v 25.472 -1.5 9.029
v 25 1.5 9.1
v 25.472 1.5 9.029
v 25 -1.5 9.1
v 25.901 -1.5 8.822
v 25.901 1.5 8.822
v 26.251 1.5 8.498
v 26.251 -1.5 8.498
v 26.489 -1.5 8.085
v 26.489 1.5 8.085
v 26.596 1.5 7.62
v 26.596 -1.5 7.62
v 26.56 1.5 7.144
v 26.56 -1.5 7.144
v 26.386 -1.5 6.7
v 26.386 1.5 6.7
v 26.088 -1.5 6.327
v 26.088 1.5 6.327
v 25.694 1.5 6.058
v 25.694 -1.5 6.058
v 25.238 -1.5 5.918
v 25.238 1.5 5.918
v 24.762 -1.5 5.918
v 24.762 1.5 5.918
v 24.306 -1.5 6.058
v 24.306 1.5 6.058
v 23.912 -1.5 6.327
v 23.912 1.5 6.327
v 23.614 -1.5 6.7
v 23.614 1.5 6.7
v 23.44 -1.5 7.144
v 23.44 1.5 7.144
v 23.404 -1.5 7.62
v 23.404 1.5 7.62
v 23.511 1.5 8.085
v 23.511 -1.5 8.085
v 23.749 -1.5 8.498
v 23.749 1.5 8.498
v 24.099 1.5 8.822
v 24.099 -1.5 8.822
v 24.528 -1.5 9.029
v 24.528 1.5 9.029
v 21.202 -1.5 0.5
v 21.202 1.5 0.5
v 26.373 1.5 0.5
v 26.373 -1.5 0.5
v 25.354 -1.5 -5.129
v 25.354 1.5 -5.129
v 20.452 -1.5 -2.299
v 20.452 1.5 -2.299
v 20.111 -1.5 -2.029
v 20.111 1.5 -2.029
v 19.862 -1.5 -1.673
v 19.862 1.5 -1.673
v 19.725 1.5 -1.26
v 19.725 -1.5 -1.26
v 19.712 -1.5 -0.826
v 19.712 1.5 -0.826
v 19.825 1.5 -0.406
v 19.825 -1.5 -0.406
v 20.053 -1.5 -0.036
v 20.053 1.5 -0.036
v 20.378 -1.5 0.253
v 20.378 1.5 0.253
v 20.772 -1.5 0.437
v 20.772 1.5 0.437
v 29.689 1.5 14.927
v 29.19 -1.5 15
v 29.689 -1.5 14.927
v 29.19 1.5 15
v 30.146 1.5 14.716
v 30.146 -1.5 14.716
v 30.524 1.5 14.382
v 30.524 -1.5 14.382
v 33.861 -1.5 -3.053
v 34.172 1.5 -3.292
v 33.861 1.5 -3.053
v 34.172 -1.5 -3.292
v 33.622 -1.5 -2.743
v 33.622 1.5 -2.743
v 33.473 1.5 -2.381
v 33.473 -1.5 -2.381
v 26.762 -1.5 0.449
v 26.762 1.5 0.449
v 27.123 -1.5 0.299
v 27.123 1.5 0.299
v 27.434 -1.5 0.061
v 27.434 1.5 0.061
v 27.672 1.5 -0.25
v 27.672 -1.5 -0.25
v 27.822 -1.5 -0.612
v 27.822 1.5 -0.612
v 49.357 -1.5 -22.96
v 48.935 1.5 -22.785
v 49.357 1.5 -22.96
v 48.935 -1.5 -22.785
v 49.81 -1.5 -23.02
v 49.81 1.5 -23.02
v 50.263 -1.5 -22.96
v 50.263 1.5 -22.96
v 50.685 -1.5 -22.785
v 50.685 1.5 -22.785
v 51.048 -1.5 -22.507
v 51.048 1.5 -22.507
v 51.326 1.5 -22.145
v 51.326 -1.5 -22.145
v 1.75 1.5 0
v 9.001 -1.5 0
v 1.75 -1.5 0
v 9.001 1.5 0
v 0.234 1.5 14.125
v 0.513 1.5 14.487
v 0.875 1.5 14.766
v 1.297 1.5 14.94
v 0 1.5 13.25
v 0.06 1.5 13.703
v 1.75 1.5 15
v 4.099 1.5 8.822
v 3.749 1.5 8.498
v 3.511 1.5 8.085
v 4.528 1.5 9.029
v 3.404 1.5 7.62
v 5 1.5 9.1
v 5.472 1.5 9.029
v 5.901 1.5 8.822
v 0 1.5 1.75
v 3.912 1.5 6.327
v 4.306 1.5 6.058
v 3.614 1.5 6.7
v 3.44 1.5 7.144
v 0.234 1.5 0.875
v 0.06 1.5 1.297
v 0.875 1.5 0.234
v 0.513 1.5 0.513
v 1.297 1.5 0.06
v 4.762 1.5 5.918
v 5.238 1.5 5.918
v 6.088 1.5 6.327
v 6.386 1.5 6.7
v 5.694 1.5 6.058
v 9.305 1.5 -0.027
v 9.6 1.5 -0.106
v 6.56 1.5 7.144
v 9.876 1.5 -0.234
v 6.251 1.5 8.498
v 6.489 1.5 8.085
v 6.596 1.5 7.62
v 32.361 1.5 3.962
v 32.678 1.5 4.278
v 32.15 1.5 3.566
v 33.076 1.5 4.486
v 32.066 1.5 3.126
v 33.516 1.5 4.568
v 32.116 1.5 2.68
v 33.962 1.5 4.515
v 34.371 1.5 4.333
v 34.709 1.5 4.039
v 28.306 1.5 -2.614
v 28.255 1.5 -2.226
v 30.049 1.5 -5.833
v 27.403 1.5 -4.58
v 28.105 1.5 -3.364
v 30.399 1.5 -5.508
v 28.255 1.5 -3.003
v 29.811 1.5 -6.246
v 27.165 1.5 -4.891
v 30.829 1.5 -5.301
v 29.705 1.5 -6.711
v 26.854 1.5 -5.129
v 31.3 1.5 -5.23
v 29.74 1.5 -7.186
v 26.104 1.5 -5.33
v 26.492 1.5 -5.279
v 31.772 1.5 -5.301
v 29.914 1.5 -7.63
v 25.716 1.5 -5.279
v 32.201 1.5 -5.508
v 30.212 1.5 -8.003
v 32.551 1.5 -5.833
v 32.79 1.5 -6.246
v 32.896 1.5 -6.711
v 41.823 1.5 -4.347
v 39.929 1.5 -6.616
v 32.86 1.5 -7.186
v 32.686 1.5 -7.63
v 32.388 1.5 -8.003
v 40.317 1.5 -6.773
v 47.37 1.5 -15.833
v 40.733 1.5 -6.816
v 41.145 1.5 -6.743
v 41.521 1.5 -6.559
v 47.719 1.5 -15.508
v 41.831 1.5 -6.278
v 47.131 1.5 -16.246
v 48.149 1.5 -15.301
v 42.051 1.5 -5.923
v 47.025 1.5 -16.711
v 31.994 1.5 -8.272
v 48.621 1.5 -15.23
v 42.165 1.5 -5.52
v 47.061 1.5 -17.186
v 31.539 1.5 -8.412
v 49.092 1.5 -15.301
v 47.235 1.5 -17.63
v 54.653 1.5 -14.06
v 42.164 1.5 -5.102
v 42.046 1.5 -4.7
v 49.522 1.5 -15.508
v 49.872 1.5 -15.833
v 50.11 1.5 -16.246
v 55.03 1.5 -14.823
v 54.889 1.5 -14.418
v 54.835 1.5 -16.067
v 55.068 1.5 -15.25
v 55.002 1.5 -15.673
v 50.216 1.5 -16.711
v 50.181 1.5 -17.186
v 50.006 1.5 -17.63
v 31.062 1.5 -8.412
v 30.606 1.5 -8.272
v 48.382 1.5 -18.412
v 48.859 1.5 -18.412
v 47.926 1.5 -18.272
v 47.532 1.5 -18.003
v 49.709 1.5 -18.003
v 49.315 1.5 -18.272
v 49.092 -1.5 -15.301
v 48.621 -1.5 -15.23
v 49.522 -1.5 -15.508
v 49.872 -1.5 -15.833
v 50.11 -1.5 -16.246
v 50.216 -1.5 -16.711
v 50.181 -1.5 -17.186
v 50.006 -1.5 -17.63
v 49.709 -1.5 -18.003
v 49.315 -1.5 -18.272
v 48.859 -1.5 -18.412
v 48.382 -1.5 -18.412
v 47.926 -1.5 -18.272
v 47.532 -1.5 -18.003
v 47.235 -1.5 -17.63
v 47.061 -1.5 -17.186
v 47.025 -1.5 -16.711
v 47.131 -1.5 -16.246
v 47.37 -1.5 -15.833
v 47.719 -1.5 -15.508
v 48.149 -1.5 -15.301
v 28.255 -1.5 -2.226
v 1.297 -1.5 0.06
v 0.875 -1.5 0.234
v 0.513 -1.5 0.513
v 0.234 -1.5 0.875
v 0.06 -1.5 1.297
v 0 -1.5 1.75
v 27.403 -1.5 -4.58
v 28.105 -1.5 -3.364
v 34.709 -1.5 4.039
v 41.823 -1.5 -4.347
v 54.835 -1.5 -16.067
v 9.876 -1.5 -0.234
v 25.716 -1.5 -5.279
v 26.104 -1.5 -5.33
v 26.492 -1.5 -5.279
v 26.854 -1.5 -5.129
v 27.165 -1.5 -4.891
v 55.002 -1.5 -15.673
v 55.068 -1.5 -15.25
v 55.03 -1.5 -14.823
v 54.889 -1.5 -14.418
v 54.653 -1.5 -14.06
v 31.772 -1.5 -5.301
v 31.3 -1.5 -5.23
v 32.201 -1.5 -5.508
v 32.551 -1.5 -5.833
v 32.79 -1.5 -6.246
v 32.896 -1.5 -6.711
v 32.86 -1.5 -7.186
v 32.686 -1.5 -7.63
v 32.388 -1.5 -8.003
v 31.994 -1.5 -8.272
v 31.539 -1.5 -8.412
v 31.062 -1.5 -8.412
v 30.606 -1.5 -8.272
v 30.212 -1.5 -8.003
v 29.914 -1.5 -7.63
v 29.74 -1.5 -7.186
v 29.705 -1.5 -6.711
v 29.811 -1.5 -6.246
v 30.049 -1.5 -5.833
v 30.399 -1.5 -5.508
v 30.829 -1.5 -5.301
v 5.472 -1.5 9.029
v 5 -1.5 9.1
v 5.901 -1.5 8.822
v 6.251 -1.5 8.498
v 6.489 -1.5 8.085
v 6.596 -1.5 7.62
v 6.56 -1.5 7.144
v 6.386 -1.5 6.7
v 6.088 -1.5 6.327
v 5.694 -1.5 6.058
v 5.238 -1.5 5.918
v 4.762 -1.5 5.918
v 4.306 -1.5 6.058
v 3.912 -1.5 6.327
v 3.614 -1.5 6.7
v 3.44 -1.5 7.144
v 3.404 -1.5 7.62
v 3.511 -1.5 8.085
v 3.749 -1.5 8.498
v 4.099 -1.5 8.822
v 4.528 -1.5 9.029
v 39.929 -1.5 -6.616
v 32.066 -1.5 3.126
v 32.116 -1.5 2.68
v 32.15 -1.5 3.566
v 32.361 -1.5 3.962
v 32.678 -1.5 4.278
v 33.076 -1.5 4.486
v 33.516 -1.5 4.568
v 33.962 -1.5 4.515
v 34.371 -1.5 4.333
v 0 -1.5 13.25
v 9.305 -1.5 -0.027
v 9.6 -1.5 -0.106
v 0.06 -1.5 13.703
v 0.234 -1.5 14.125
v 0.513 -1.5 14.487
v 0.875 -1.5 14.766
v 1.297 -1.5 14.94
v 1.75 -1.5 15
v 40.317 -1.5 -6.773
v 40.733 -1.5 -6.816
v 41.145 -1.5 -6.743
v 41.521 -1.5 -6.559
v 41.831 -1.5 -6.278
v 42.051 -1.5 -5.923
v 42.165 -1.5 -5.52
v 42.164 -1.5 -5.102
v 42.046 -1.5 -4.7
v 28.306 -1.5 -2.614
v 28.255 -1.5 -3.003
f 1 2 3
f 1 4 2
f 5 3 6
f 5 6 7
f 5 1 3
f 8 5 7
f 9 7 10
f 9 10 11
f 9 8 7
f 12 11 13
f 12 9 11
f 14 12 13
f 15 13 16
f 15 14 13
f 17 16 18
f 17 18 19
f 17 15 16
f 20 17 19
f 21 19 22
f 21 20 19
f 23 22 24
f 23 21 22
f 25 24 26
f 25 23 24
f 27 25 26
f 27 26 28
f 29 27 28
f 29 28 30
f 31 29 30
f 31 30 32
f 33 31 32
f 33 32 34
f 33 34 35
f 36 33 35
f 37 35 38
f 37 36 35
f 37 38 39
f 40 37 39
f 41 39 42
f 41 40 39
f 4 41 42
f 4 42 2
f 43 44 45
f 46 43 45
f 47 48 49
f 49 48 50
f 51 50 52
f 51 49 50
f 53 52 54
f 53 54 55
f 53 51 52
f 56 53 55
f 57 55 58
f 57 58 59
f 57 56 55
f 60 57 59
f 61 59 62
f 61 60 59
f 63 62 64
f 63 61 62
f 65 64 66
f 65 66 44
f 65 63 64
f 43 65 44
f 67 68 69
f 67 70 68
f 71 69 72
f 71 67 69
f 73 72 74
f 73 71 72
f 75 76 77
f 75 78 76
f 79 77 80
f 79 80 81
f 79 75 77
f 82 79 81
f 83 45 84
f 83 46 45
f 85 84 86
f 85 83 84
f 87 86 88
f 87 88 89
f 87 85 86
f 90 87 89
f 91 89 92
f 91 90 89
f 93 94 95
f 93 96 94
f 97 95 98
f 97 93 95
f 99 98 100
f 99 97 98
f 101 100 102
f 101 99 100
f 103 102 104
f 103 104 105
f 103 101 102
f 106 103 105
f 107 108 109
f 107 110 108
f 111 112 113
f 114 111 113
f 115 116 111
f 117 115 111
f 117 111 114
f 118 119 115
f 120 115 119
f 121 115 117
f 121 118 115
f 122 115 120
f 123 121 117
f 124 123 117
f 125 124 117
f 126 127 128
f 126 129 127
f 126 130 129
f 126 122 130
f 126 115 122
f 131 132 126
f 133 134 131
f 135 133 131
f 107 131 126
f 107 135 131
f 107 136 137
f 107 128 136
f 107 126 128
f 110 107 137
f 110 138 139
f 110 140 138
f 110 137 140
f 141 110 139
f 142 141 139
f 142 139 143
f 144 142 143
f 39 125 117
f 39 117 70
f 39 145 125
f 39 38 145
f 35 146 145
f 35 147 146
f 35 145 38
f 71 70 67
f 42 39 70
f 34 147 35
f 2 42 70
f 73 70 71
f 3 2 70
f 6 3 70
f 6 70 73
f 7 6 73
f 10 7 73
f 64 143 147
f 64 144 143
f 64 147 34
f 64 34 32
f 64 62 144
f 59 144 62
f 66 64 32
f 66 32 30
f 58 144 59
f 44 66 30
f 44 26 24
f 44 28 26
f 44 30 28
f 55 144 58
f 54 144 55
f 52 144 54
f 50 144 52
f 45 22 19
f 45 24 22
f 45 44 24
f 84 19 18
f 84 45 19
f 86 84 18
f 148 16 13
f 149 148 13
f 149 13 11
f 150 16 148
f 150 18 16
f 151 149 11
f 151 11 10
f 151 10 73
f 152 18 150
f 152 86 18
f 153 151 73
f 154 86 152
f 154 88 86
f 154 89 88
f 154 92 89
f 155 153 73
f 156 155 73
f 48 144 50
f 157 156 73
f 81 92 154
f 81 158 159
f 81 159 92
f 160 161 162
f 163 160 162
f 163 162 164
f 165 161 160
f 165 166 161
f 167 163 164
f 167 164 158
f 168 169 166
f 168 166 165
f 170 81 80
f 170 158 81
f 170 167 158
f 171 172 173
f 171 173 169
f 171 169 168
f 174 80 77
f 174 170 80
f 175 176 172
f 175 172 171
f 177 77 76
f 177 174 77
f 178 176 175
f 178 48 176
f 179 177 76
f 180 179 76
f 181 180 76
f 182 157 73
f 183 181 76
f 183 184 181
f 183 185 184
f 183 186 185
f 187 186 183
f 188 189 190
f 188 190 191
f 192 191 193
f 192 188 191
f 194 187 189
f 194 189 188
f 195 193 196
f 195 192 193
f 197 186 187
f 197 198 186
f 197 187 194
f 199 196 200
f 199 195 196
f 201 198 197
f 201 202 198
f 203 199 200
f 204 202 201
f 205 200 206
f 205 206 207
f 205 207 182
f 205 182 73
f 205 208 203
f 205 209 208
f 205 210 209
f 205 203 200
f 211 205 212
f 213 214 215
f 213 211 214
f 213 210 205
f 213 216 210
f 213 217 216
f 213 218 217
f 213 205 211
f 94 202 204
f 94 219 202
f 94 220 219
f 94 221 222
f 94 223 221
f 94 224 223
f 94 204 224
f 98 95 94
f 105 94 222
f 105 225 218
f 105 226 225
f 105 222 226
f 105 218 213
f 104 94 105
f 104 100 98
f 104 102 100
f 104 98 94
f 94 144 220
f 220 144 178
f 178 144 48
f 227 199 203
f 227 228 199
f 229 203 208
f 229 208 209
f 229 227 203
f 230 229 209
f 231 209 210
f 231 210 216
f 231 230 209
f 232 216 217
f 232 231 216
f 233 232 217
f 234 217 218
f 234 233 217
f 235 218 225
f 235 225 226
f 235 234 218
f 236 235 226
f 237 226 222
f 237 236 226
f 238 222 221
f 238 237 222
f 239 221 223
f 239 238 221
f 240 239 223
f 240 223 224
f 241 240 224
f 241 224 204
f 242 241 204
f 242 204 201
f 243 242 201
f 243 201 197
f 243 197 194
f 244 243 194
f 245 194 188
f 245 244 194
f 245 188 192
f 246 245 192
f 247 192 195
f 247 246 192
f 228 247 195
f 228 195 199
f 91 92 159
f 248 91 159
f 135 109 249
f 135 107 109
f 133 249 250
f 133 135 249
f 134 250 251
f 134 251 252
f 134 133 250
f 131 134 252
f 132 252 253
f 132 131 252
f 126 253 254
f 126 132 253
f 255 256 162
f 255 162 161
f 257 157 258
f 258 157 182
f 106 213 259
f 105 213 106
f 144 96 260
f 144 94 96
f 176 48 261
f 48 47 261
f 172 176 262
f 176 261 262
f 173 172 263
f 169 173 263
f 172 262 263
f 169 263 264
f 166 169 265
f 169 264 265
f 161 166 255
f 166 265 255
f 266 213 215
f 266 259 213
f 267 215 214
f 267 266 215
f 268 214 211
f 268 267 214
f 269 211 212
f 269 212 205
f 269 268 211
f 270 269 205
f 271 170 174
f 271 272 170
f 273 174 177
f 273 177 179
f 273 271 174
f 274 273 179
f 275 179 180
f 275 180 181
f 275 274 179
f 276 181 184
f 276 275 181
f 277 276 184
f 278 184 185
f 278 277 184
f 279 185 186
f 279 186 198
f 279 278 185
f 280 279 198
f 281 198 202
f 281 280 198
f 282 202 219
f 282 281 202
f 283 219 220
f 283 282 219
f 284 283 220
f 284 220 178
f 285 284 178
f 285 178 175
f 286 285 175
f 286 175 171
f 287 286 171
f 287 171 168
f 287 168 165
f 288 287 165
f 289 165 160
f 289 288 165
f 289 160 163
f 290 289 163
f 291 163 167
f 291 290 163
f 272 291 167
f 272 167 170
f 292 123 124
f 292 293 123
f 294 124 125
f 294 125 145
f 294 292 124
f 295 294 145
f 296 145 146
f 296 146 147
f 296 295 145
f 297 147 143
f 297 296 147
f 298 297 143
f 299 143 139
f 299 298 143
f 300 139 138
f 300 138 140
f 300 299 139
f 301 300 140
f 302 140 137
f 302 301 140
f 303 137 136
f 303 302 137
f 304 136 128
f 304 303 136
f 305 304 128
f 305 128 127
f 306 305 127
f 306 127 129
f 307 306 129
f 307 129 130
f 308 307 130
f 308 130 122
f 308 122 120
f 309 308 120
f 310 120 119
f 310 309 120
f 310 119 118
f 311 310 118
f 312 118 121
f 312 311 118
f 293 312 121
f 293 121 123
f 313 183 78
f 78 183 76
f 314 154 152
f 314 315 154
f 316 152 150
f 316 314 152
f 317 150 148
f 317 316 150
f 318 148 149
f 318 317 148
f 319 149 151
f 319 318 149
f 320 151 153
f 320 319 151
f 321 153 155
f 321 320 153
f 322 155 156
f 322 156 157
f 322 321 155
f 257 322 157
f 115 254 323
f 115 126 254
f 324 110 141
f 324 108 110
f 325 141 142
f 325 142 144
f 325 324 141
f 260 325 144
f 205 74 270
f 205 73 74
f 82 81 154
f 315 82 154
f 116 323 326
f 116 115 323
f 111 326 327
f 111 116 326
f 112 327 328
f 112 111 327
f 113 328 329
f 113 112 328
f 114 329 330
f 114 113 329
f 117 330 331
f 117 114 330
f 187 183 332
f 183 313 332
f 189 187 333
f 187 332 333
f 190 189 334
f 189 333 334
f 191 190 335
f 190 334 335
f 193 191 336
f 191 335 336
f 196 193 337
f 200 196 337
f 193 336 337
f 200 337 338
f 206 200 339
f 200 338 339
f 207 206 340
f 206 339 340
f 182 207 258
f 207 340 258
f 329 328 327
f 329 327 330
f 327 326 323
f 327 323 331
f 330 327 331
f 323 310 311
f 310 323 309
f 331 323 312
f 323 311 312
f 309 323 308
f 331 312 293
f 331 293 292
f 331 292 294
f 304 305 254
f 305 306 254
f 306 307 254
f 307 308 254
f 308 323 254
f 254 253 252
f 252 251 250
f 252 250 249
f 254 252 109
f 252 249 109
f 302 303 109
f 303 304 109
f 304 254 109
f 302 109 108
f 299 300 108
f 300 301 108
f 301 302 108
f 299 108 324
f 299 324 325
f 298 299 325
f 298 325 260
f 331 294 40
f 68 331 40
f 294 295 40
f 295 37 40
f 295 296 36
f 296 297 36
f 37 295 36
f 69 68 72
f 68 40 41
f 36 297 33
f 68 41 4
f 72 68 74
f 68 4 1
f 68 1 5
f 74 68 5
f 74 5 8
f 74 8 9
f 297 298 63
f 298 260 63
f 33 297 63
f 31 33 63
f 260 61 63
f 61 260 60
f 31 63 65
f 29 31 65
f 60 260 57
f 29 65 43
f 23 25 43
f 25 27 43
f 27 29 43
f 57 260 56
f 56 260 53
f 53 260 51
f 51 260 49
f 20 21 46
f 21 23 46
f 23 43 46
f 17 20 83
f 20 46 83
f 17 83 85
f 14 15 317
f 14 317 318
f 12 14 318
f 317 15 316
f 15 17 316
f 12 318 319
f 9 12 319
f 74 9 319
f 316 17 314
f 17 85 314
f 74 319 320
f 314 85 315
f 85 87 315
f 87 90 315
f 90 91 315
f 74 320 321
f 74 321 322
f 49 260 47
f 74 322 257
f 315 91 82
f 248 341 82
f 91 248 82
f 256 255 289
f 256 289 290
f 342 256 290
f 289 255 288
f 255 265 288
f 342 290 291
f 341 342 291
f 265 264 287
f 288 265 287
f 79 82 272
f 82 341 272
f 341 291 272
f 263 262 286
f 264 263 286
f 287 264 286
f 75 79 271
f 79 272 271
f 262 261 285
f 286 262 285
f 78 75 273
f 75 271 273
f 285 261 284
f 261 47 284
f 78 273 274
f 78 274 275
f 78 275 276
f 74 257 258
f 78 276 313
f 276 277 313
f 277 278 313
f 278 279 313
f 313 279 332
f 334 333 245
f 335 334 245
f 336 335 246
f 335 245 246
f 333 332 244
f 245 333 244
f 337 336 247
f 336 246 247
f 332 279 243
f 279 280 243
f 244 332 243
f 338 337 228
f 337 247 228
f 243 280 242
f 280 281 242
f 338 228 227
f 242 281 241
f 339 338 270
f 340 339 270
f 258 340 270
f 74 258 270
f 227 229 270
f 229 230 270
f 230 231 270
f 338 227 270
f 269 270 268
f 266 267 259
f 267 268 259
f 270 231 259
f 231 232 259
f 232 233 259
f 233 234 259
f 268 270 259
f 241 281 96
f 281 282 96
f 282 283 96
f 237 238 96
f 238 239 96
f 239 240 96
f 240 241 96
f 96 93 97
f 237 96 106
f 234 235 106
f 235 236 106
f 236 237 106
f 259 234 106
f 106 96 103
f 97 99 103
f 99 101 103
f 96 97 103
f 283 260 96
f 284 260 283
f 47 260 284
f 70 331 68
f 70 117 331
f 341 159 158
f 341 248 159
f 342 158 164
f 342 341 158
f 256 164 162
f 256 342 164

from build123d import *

# Parameters (mm, degrees)
SKETCH_2_R          = 1.5999999999999899
SKETCH_2_R_2        = 1.6000000000000019
SKETCH_2_R_3        = 1.600000000000012
SKETCH_2_R_4        = 1.5999999999999999
EXTRUDE_1_DEPTH     = 1.5
CUT_EXTRUDE_1_DEPTH = 3
FILLET_1_R          = 1
FILLET_2_R          = 1.75
MOVE_FACE_1_BY      = 0.5
MOVE_FACE_1_2_BY    = 0.5
MOVE_FACE_1_3_BY    = 0.5
MOVE_FACE_1_4_BY    = 0.5
MOVE_FACE_1_5_BY    = 0.5
MOVE_FACE_1_6_BY    = 0.5
MOVE_FACE_1_7_BY    = 0.5
MOVE_FACE_1_8_BY    = 0.5
MOVE_FACE_1_9_BY    = 0.5
MOVE_FACE_1_10_BY   = 0.5
MOVE_FACE_1_11_BY   = 0.5
MOVE_FACE_1_12_BY   = 0.5
MOVE_FACE_1_13_BY   = 0.5
MOVE_FACE_1_14_BY   = 0.5


with BuildPart() as part:
    # ｽｹｯﾁ2 → ﾎﾞｽ - 押し出し1 (new, symmetric)
    with BuildSketch(Plane(origin=(0, 0, 0), x_dir=(1, 0, 0), z_dir=(0, 1, 0))):
        Polygon((24.47000000000005, 8.660254037844277), (9.470000000000297, 1.73e-15), (0, 0), (0, -14.999999999999998), (30.000000000000004, -14.999999999999995), (55.450762113533145, 15.000000000000043), (50.450762113533166, 23.66025403784434), align=None)
        with Locations(Location((48.62063509461097, 16.830127018922173, 0), (0, 0, 270))):
            Circle(SKETCH_2_R, mode=Mode.SUBTRACT)
        with Locations(Location((25, -7.5, 0), (0, 0, 270))):
            Circle(SKETCH_2_R_2, mode=Mode.SUBTRACT)
        with Locations(Location((31.300127018922208, 6.830127018922147, 0), (0, 0, 270))):
            Circle(SKETCH_2_R_3, mode=Mode.SUBTRACT)
        with Locations(Location((5, -7.5, 0), (0, 0, 270))):
            Circle(SKETCH_2_R_4, mode=Mode.SUBTRACT)
    extrude(amount=EXTRUDE_1_DEPTH, both=True)

    # ｽｹｯﾁ3 → ｶｯﾄ - 押し出し1 (cut)
    with BuildSketch(Plane(origin=(0, 1.5, 0), x_dir=(1, 0, 0), z_dir=(0, 1, 0))):
        Polygon((26.470000000000045, 5.196152422706529), (17.470000000000258, -3.55e-15), (27.140628594077313, 0), (27.879009742330265, 2.755675960631065), align=None)
        Polygon((33.35228567653781, 0), (37.47986861759486, 0), (45.16947255557436, 9.064094706096034), (34.06279326771847, 2.651650429449568), align=None)
        Polygon((31.446764780347493, -7.111500799466448), (37.47986861759486, 3.55e-15), (33.35228567653781, 0), align=None)
    extrude(amount=-CUT_EXTRUDE_1_DEPTH, mode=Mode.SUBTRACT)

    # ﾌｨﾚｯﾄ1
    fillet_1_edges = [part.edges().sort_by_distance(p)[0] for p in [
        (27.87900974233027, 0, -2.7556759606310655),
        (27.140628594077313, 0, -8.9e-16),
        (17.47000000000026, 0, 1.78e-15),
        (26.47000000000005, 0, -5.19615242270653),
        (34.06279326771847, 0, -2.6516504294495666),
        (45.16947255557436, 0, -9.064094706096032),
        (31.446764780347493, 0, 7.111500799466448),
    ]]
    fillet(fillet_1_edges, radius=FILLET_1_R)

    # ﾌｨﾚｯﾄ2
    fillet_2_edges = [part.edges().sort_by_distance(p)[0] for p in [
        (50.450762113533166, 0, -23.66025403784434),
        (55.450762113533145, 0, -15.000000000000043),
        (30.000000000000004, 0, 14.999999999999995),
        (0, 0, 14.999999999999998),
        (0, 0, 0),
        (9.470000000000297, 0, -1.73e-15),
    ]]
    fillet(fillet_2_edges, radius=FILLET_2_R)

    # Move Face 1: a face moved inward by 0.5
    extrude(part.faces().sort_by_distance((33.277523818, 0, 0.279015055))[0], amount=MOVE_FACE_1_BY, dir=(-0.965925826, 0, -0.258819045), mode=Mode.SUBTRACT)

    # Move Face 1 2: a curved face moved inward by 0.5
    add(Solid.thicken(part.faces().sort_by_distance((33.10124082, 0, 3.954158856))[0], -MOVE_FACE_1_2_BY), mode=Mode.SUBTRACT)

    # Move Face 1 3: a face moved inward by 0.5
    extrude(part.faces().sort_by_distance((37.884808697, 0, -0.477321752))[0], amount=MOVE_FACE_1_3_BY, dir=(0.762556575, 0, 0.646921533), mode=Mode.SUBTRACT)

    # Move Face 1 4: a curved face moved inward by 0.5
    add(Solid.thicken(part.faces().sort_by_distance((41.44689767, 0, -5.957600166))[0], -MOVE_FACE_1_4_BY), mode=Mode.SUBTRACT)

    # Move Face 1 5: a face moved inward by 0.5
    extrude(part.faces().sort_by_distance((37.300315213, 0, -4.520834596))[0], amount=MOVE_FACE_1_5_BY, dir=(-0.5, 0, -0.866025404), mode=Mode.SUBTRACT)

    # Move Face 1 6: a curved face moved inward by 0.5
    add(Solid.thicken(part.faces().sort_by_distance((34.128159395, 0, -2.601493236))[0], -MOVE_FACE_1_6_BY), mode=Mode.SUBTRACT)

    # Move Face 1 7: a curved face moved inward by 0.5
    add(Solid.thicken(part.faces().sort_by_distance((20.236124981, 0, -0.741180955))[0], -MOVE_FACE_1_7_BY), mode=Mode.SUBTRACT)

    # Move Face 1 8: a face moved inward by 0.5
    extrude(part.faces().sort_by_distance((23.787676207, 0, 0))[0], amount=MOVE_FACE_1_8_BY, dir=(0, 0, 1), mode=Mode.SUBTRACT)

    # Move Face 1 9: a curved face moved inward by 0.5
    add(Solid.thicken(part.faces().sort_by_distance((26.982063035, 0, -0.20664666))[0], -MOVE_FACE_1_9_BY), mode=Mode.SUBTRACT)

    # Move Face 1 10: a face moved inward by 0.5
    extrude(part.faces().sort_by_distance((27.555515408, 0, -1.548378669))[0], amount=MOVE_FACE_1_10_BY, dir=(0.965925826, 0, 0.258819045), mode=Mode.SUBTRACT)

    # Move Face 1 11: a curved face moved inward by 0.5
    add(Solid.thicken(part.faces().sort_by_distance((27.797322419, 0, -2.74492162))[0], -MOVE_FACE_1_11_BY), mode=Mode.SUBTRACT)

    # Move Face 1 12: a face moved inward by 0.5
    extrude(part.faces().sort_by_distance((27.320951481, 0, -3.722261224))[0], amount=MOVE_FACE_1_12_BY, dir=(0.866025404, 0, -0.5), mode=Mode.SUBTRACT)

    # Move Face 1 13: a curved face moved inward by 0.5
    add(Solid.thicken(part.faces().sort_by_distance((26.362793641, 0, -4.796052845))[0], -MOVE_FACE_1_13_BY), mode=Mode.SUBTRACT)

    # Move Face 1 14: a face moved inward by 0.5
    extrude(part.faces().sort_by_distance((23.153012702, 0, -3.281088913))[0], amount=MOVE_FACE_1_14_BY, dir=(-0.5, 0, -0.866025404), mode=Mode.SUBTRACT)


solid = part.part
